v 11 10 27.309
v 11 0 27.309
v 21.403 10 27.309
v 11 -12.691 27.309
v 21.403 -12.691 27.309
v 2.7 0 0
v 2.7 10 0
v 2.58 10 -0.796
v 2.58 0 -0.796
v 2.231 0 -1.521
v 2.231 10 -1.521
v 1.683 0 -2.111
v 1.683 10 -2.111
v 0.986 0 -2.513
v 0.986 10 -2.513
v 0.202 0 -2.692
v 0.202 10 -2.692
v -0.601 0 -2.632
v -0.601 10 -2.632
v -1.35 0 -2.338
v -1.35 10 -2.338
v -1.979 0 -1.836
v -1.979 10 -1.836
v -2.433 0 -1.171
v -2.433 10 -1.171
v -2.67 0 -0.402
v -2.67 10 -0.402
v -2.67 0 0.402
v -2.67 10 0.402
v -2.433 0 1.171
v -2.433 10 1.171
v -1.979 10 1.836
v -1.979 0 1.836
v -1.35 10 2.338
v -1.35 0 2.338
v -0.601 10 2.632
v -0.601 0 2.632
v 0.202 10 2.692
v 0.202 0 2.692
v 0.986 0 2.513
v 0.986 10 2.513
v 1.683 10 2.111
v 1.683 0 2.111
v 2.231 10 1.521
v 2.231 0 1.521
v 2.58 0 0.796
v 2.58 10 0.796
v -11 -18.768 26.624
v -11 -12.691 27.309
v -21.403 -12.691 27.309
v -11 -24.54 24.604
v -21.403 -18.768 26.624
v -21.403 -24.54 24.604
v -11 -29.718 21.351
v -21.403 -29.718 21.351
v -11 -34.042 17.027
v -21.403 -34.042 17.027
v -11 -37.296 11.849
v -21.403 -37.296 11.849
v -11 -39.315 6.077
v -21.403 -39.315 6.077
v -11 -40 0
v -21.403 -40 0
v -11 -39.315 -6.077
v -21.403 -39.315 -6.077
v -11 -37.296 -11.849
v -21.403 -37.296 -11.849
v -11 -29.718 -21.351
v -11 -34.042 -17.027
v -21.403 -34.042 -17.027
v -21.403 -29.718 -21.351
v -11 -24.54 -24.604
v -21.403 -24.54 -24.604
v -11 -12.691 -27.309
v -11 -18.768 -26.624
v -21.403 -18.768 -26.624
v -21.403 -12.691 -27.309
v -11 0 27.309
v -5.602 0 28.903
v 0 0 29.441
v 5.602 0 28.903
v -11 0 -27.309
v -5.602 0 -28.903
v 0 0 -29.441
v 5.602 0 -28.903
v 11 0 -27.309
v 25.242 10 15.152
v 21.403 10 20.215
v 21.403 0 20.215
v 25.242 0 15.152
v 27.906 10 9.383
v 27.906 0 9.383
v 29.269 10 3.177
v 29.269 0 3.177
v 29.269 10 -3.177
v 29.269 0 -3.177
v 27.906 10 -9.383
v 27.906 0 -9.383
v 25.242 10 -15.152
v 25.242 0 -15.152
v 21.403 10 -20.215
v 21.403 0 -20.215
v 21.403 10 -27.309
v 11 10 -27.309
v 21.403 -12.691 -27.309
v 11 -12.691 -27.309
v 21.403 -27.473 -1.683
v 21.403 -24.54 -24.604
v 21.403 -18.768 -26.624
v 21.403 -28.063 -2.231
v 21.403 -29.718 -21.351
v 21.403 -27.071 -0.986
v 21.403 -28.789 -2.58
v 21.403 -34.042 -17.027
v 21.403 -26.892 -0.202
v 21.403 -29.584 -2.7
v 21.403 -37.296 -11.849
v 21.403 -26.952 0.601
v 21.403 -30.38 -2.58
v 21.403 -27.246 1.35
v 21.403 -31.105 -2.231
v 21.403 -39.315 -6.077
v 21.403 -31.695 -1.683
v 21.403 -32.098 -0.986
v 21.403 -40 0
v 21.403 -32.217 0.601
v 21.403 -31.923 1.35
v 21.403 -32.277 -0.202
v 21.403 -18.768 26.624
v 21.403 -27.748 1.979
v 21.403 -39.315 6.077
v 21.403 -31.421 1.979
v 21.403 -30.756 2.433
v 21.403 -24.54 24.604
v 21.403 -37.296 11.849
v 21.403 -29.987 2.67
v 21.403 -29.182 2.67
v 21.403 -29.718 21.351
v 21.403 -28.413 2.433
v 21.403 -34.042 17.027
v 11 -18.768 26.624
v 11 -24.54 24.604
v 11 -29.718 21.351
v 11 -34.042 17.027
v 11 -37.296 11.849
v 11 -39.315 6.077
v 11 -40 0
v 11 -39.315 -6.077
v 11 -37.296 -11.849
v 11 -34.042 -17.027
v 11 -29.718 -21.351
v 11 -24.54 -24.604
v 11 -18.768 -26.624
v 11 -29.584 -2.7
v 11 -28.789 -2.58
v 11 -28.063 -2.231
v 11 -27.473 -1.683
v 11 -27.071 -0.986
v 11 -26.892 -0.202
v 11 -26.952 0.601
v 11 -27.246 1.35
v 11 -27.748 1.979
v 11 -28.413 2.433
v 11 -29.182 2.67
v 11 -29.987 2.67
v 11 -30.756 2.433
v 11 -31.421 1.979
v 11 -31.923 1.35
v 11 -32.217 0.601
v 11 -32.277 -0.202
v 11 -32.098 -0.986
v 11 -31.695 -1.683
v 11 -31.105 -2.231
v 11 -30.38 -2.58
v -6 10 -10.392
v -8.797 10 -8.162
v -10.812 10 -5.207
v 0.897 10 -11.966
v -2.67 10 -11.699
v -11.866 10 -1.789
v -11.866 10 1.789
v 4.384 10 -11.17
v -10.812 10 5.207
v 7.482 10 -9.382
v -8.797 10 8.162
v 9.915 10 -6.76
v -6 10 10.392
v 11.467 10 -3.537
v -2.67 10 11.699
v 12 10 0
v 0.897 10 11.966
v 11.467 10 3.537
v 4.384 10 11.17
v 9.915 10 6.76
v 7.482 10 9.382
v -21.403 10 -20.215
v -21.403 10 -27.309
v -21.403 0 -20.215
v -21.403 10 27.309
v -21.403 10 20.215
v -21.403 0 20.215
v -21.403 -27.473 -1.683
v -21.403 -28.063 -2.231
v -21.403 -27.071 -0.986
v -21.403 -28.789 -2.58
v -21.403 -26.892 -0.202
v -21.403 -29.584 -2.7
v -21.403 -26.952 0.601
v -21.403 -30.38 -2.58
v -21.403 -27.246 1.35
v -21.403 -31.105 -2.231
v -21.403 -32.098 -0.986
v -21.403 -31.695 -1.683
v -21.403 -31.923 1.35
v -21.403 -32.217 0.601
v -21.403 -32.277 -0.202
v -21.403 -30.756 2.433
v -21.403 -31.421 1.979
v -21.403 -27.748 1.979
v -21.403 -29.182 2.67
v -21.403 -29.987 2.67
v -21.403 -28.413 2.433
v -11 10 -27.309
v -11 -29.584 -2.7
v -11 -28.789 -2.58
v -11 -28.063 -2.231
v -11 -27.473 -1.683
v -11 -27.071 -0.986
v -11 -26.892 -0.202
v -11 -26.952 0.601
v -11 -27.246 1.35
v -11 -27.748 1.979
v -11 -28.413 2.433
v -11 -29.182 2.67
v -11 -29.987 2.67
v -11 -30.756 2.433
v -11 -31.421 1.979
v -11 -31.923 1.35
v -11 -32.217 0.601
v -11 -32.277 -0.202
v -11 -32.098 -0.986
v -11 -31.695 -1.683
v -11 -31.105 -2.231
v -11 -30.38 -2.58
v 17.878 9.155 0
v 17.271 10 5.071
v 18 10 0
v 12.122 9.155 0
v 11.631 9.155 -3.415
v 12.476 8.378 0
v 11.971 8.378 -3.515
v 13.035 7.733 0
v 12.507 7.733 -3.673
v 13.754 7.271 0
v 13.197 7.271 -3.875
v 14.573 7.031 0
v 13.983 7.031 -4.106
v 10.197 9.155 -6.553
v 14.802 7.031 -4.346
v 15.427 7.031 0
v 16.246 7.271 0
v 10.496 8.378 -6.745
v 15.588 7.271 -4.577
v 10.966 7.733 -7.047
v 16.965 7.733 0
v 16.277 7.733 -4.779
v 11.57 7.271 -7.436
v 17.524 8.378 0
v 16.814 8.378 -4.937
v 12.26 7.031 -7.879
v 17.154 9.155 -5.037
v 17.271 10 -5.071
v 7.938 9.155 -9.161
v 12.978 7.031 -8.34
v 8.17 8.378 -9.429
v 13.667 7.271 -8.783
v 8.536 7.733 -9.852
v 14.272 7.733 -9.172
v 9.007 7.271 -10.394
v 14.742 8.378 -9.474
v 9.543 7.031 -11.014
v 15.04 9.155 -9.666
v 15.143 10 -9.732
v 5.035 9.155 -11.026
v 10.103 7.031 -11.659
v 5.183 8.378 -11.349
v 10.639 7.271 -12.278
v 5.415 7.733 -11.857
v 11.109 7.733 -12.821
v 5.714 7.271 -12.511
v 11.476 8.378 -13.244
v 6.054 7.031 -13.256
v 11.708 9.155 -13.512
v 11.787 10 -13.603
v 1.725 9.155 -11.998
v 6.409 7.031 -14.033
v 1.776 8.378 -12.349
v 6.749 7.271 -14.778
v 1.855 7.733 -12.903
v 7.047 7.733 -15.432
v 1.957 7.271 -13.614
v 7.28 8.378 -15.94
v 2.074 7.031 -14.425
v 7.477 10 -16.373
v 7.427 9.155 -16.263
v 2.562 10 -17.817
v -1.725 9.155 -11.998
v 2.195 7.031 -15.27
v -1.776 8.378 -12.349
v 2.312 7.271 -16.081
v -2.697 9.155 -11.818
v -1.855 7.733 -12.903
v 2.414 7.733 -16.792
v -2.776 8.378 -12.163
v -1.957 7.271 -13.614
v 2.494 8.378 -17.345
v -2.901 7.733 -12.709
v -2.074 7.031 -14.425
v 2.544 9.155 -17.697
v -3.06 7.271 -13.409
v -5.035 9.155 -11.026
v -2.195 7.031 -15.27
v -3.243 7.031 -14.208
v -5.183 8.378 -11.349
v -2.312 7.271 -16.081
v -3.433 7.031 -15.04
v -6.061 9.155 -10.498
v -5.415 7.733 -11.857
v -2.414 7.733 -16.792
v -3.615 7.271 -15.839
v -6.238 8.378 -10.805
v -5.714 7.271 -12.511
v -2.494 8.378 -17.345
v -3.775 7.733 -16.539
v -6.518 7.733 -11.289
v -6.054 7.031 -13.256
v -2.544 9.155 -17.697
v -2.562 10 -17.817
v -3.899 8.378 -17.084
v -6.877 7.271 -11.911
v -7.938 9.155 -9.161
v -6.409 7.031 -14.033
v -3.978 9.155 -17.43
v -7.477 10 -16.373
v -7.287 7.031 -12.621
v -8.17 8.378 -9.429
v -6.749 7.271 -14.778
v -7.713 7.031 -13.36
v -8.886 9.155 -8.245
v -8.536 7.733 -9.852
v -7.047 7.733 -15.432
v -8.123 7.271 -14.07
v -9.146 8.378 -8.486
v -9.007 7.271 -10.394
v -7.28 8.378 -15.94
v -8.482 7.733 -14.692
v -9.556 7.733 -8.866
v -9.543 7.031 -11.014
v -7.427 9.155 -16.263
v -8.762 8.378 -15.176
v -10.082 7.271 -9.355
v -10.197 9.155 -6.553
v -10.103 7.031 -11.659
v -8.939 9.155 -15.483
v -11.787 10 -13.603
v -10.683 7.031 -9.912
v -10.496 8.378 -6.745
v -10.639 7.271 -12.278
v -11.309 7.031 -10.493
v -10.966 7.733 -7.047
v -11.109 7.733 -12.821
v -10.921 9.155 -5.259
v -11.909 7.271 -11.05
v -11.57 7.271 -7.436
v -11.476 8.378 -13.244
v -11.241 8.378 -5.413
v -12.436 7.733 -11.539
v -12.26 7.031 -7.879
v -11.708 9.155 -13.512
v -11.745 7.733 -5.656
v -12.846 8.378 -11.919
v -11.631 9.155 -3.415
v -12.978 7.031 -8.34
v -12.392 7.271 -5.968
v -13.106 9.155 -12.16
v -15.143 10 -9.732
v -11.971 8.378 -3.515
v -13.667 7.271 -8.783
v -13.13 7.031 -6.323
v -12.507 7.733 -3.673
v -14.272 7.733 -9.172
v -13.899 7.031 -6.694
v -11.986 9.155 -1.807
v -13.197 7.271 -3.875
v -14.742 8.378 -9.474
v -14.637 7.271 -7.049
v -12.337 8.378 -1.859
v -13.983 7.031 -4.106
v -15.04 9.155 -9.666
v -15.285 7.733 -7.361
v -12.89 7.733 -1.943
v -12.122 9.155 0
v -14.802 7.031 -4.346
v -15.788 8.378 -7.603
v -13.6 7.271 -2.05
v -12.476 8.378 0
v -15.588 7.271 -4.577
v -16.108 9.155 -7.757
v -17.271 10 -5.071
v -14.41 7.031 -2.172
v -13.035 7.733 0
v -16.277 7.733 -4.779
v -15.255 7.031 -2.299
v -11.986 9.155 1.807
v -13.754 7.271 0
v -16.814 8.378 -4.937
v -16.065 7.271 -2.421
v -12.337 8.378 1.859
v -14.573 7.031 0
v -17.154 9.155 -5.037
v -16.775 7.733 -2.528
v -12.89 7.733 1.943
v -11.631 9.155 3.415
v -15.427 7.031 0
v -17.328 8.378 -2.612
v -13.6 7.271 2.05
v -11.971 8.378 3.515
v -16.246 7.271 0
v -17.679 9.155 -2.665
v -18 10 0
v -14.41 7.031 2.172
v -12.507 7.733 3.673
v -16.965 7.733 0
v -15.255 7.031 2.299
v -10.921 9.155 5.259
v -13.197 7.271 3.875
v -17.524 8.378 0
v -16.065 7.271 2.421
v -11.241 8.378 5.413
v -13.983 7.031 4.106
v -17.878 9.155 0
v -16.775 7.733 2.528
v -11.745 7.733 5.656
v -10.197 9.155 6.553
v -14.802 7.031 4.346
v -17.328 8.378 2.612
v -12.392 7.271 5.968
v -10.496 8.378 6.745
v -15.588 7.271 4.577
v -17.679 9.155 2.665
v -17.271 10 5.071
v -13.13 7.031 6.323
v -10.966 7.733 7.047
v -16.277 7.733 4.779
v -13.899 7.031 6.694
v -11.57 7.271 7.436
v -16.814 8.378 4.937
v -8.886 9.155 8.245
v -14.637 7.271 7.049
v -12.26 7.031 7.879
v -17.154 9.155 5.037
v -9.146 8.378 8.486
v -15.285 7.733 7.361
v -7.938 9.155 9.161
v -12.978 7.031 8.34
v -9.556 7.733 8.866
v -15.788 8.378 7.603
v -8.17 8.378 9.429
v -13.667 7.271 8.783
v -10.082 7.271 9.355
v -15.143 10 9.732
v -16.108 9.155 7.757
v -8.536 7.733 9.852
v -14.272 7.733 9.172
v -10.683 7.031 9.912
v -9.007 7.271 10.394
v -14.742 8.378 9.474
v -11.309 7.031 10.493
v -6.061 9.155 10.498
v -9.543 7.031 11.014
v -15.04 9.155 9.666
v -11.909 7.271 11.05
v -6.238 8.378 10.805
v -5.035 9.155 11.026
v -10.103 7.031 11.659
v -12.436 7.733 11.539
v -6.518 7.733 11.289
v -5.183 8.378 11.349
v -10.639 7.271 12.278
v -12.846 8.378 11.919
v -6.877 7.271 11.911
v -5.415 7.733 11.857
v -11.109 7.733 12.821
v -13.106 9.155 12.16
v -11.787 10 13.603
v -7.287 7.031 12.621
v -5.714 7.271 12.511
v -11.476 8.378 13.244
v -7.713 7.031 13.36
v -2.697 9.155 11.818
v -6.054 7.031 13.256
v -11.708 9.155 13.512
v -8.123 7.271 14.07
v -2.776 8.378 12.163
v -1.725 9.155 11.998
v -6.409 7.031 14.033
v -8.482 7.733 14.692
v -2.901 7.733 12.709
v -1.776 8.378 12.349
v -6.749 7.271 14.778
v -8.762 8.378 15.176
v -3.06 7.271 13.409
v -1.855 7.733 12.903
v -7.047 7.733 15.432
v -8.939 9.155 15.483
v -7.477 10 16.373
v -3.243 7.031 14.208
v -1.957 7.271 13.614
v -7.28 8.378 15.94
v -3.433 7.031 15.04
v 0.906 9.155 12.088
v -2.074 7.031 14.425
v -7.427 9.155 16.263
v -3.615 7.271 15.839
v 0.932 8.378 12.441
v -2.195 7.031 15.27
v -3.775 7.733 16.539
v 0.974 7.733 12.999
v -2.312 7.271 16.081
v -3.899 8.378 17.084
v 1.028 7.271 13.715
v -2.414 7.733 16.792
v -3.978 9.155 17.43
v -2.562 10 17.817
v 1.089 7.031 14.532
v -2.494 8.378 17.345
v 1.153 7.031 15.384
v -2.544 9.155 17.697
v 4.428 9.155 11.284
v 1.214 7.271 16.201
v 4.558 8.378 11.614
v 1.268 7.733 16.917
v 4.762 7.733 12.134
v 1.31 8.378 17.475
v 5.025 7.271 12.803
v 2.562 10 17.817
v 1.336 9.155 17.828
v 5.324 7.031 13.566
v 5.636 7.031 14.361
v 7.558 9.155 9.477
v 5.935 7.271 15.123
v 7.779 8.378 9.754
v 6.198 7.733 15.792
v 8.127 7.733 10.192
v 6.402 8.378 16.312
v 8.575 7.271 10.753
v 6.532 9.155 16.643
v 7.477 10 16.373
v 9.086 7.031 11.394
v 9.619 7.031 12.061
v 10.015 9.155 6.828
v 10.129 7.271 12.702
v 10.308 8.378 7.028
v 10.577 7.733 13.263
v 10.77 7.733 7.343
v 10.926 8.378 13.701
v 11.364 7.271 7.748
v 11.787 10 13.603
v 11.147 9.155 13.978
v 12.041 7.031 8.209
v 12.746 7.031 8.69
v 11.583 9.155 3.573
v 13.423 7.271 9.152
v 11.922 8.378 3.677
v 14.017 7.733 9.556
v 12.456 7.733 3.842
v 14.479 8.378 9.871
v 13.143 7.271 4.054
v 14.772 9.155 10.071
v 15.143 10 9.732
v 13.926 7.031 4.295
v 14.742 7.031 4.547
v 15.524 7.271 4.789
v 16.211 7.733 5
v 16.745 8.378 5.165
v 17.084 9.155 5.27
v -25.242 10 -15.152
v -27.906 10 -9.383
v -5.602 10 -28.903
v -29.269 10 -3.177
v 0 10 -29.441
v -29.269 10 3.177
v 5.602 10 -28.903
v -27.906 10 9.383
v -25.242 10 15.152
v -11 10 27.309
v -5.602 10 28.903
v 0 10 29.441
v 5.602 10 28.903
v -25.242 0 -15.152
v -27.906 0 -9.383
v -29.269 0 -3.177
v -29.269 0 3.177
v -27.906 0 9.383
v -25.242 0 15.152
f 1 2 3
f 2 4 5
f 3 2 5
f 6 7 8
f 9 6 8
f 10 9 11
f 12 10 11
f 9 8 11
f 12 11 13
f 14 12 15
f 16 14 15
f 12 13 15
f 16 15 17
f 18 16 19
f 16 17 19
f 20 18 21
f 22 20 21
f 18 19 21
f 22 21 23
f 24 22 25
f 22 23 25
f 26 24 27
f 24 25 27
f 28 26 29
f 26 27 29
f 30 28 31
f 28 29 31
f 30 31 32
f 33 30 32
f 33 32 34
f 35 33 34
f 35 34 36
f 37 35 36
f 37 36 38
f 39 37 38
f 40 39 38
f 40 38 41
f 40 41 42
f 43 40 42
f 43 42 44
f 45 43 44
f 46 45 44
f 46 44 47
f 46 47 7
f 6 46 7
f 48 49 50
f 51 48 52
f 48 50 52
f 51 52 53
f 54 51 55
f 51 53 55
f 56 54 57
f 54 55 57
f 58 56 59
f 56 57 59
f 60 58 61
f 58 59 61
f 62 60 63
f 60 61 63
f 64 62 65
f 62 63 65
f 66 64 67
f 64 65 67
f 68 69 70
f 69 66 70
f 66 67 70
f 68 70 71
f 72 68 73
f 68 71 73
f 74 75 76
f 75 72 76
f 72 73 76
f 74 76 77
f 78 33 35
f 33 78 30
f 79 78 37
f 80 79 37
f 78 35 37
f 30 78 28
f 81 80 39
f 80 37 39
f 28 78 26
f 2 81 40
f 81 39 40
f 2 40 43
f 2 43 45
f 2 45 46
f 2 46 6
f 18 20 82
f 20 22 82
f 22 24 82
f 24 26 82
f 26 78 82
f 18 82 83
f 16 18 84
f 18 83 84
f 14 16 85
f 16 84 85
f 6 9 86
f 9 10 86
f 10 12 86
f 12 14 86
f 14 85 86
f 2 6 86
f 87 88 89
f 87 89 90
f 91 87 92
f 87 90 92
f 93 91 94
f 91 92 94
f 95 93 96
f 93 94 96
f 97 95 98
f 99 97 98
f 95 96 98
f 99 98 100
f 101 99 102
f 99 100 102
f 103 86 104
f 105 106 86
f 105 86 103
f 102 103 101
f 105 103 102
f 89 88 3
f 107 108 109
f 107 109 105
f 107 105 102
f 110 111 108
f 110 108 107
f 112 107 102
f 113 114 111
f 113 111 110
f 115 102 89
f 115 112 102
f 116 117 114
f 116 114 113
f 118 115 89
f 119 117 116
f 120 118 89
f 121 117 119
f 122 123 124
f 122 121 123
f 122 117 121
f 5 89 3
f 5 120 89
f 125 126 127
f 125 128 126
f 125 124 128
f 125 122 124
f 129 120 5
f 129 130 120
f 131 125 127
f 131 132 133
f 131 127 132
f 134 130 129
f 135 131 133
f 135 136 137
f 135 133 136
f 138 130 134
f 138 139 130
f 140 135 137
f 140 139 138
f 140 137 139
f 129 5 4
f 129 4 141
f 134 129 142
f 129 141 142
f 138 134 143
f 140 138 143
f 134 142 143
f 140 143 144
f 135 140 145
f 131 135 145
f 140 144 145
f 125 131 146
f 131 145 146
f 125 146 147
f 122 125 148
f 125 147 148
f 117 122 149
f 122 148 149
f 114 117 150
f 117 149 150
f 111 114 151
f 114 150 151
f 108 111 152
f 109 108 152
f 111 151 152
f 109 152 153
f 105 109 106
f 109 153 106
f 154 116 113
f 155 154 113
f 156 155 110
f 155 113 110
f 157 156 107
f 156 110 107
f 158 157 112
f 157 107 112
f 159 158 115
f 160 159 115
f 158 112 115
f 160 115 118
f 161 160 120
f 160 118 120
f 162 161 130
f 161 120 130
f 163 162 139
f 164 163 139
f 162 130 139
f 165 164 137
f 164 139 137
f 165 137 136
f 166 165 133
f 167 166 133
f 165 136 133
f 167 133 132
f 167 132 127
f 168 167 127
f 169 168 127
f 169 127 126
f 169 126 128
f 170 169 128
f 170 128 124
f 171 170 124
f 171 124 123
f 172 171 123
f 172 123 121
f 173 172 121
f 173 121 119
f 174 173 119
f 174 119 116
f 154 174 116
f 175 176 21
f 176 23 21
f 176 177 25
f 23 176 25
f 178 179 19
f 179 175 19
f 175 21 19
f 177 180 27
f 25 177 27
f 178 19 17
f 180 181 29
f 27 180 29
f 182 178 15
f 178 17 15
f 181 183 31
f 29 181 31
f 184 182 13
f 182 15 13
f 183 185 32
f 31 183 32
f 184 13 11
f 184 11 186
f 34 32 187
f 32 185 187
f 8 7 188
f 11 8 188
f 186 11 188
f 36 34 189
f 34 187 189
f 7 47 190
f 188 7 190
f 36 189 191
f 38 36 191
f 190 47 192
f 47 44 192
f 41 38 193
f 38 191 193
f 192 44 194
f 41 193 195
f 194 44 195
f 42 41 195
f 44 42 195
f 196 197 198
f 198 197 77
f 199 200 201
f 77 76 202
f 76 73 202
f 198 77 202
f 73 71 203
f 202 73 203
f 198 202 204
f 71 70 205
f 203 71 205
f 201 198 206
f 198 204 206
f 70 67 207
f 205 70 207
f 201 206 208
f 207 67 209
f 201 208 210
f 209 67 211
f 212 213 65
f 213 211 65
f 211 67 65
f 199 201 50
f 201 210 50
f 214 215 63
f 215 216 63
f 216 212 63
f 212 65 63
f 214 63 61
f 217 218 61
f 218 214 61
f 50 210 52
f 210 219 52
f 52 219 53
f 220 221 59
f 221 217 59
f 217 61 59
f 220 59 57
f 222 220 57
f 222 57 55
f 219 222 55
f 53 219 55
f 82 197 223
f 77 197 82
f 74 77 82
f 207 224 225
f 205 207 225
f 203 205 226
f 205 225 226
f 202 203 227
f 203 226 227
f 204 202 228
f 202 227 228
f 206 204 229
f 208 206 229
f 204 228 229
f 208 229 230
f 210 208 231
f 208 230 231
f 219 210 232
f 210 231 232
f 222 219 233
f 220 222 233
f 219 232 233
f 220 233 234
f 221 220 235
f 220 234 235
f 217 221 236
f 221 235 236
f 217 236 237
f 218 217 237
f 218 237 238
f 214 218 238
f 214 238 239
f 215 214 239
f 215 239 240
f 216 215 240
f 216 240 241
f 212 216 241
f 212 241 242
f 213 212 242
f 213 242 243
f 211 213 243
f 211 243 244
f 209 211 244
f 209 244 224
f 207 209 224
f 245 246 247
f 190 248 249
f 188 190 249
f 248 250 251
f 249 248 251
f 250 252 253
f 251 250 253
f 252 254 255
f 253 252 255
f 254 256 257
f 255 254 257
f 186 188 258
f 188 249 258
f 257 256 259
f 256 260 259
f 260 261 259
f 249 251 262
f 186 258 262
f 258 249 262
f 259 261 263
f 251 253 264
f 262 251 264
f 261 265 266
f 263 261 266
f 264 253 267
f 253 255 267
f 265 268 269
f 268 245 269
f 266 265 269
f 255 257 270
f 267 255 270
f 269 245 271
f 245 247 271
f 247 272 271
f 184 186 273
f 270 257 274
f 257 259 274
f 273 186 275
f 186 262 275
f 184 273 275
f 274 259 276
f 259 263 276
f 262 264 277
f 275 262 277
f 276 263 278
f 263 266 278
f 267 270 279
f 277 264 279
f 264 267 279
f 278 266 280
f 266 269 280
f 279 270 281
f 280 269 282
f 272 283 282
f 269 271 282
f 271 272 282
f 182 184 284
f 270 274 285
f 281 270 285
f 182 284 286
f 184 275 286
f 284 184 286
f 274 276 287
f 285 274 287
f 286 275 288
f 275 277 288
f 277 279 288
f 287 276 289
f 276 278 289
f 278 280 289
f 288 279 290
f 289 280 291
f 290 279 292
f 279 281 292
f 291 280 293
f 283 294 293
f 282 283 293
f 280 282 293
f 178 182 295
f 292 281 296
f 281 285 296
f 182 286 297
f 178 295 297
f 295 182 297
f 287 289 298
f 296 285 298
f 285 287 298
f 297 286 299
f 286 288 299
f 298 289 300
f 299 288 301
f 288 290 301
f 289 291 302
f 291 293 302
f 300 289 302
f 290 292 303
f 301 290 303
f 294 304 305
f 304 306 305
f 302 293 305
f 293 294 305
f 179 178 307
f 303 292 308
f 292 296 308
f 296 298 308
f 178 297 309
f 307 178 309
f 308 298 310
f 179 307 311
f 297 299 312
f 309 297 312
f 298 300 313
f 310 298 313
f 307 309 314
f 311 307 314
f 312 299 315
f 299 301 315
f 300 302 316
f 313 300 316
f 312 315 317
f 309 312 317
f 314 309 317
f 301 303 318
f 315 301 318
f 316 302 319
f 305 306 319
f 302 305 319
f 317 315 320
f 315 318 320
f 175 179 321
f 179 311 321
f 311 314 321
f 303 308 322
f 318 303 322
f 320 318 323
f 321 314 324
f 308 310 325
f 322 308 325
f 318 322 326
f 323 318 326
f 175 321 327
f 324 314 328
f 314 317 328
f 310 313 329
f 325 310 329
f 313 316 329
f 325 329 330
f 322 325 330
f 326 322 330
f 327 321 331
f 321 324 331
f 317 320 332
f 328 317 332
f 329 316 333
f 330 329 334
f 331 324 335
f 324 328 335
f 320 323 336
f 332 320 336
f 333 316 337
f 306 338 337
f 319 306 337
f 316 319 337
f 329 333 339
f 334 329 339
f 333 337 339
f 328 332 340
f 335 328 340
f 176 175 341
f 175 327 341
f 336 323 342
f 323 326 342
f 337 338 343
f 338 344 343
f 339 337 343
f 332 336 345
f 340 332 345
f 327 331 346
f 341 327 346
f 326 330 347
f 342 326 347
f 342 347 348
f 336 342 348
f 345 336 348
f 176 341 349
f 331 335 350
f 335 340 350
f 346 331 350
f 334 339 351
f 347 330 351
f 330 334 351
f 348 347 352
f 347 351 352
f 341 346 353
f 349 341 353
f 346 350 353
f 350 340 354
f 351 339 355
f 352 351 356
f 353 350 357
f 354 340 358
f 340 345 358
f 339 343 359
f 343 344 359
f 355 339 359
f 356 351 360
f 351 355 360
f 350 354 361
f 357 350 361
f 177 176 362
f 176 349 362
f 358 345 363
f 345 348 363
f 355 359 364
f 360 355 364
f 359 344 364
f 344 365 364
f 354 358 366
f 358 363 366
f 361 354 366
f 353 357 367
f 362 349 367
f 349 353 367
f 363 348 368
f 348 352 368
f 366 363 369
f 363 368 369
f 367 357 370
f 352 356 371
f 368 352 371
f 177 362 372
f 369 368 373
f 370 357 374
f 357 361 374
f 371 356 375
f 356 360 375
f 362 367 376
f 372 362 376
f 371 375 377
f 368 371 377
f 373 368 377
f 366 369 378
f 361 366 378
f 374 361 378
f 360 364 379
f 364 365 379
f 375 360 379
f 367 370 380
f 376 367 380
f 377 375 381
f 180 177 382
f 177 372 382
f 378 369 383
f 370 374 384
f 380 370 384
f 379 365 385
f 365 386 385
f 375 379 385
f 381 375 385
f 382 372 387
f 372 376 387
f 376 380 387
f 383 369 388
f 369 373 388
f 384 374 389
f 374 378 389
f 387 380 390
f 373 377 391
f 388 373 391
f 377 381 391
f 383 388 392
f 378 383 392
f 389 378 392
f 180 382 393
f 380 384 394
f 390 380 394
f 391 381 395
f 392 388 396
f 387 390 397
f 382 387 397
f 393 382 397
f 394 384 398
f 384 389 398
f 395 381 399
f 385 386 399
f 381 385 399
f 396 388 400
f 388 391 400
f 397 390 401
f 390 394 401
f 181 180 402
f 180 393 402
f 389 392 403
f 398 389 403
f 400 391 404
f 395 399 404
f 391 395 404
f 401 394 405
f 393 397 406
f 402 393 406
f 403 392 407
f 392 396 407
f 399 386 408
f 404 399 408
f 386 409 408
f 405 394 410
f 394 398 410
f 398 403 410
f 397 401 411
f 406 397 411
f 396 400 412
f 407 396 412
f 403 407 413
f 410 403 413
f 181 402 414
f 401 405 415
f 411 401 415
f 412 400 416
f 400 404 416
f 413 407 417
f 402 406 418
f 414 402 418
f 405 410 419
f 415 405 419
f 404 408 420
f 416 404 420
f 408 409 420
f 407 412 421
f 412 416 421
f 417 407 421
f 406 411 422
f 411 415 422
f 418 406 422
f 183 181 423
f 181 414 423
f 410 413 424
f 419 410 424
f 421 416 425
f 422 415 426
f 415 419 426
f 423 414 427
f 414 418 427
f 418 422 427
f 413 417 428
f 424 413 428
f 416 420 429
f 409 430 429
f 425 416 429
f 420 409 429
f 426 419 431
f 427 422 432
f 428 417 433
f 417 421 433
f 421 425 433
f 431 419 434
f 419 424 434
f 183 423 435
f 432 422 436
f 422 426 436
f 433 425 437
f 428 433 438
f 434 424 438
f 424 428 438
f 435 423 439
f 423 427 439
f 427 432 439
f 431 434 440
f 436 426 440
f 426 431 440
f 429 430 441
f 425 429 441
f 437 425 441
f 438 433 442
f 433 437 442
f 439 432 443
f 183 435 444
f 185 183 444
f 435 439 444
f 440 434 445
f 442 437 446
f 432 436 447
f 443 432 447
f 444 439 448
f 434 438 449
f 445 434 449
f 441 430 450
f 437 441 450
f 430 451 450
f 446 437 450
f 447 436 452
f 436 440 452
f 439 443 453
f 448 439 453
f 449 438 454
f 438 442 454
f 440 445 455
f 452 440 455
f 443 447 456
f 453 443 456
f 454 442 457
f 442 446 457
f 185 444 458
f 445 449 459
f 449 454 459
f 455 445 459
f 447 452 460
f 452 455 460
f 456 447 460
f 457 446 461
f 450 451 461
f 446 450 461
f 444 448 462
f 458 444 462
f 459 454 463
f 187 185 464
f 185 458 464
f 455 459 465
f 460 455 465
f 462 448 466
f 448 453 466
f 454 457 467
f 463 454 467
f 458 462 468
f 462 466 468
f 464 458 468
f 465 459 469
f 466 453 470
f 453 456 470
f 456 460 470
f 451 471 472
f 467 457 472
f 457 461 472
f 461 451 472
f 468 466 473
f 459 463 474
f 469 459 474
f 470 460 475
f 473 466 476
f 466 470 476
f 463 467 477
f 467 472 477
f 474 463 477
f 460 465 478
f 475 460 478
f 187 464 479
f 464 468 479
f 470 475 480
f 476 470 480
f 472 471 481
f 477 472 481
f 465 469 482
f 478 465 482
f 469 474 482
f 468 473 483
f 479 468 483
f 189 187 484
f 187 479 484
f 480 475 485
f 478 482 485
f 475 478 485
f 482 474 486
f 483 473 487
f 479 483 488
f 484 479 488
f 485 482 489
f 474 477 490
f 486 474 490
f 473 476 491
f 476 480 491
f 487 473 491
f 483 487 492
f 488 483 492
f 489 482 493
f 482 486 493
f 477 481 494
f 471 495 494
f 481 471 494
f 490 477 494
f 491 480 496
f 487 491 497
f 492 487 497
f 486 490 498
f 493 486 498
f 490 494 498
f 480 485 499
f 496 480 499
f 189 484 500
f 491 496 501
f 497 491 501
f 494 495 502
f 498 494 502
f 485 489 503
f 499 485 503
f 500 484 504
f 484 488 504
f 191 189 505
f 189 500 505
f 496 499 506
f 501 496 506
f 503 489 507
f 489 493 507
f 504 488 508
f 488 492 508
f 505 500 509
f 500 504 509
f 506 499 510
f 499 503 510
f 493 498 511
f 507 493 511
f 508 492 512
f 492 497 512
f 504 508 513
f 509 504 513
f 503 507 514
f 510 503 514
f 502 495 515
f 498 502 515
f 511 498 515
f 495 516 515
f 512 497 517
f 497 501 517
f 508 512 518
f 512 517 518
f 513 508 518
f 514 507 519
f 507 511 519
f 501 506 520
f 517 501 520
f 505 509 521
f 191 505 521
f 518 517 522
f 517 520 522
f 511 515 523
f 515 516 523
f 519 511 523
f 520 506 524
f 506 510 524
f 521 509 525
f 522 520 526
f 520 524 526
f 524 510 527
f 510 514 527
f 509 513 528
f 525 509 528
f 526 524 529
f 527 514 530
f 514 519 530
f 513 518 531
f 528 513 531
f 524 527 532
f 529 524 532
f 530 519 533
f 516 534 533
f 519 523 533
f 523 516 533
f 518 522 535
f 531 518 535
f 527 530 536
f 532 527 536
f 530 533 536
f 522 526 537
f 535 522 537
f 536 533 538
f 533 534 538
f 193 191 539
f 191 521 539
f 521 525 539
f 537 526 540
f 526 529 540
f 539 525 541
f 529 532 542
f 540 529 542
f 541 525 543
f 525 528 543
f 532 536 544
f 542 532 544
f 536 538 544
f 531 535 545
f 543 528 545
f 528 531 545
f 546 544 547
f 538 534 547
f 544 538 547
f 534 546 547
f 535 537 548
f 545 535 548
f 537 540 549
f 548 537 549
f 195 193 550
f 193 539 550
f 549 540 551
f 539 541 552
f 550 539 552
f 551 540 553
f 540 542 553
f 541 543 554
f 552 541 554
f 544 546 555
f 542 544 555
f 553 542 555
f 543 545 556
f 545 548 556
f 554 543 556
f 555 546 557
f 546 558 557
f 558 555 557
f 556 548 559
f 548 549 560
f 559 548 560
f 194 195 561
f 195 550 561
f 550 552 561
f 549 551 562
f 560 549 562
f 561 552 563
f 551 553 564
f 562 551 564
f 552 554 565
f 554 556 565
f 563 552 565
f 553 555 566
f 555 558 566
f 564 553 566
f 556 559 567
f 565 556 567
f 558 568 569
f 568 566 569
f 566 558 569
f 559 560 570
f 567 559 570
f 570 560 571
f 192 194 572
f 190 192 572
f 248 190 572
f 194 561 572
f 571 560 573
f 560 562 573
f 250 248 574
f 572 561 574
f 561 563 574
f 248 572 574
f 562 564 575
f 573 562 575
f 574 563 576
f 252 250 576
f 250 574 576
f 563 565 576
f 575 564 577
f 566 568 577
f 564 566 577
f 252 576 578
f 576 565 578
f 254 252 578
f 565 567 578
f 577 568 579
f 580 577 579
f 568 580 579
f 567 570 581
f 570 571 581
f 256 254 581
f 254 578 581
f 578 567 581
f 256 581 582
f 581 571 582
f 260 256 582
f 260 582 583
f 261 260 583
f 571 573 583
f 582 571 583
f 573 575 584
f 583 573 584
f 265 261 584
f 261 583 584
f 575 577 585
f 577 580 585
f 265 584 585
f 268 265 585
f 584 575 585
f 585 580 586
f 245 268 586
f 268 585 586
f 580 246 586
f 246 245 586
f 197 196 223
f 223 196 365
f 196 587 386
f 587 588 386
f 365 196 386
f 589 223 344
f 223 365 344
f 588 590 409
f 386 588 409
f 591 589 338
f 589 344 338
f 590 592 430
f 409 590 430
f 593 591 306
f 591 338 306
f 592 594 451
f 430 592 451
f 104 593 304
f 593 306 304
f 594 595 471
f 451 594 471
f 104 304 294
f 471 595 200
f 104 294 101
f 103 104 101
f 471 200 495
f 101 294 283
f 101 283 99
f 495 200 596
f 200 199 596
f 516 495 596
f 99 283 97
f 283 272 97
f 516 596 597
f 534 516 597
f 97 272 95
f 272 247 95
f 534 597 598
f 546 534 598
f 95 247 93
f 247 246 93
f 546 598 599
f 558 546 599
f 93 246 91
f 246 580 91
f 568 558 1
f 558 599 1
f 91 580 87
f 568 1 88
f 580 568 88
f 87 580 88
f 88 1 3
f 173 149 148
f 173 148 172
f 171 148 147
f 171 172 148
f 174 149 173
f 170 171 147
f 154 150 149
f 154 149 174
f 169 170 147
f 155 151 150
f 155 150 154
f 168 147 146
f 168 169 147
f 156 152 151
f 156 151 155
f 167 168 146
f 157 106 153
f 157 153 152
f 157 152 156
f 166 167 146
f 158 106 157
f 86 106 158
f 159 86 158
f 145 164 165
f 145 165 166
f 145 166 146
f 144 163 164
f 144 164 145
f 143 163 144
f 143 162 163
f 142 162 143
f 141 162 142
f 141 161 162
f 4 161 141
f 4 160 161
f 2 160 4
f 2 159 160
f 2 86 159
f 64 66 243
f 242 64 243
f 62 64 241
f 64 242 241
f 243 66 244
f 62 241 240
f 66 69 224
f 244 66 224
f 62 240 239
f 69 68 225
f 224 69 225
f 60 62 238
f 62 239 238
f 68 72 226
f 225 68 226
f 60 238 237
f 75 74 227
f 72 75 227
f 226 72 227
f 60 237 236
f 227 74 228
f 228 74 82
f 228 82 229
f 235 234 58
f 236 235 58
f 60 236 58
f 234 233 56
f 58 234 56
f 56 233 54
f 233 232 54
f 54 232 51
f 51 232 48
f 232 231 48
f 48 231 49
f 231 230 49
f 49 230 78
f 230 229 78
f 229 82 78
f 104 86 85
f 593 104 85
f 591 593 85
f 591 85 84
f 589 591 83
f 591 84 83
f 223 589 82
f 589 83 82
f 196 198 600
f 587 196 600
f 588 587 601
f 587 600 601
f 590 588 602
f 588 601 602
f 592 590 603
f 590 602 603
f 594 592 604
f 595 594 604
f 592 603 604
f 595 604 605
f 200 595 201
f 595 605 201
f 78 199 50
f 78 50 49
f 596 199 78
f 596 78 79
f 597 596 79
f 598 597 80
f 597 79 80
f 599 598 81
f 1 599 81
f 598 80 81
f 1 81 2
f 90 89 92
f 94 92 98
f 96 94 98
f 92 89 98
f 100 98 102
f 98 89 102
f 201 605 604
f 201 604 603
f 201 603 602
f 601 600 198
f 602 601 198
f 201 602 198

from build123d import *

# Parameters (mm, degrees)
SKETCH1_R                = 29.440979716
BOSS_EXTRUDE1_DEPTH      = 10
SKETCH2_W                = 10.403384244
SKETCH2_H                = 54.617626702
BOSS_EXTRUDE2_DEPTH      = 40
BOSS_EXTRUDE2_DEPTH_BACK = 10
SKETCH3_R                = 2.7
CUT_EXTRUDE1_DEPTH       = 80
SKETCH4_R                = 2.7
CUT_EXTRUDE2_DEPTH       = 80
CUT_EXTRUDE2_DEPTH_BACK  = 80
SKETCH6_R                = 3
CUT_EXTRUDE3_DEPTH       = 80


with BuildPart() as part:
    # Sketch1 → Boss-Extrude1 (new body)
    with BuildSketch(Plane(origin=(0, 0, 0), x_dir=(1, 0, 0), z_dir=(0, 1, 0))):
        Circle(SKETCH1_R)
    extrude(amount=BOSS_EXTRUDE1_DEPTH)

    # Sketch2 → Boss-Extrude2 (add, two sides)
    with BuildSketch(Plane.XZ) as boss_extrude2_sk:
        with Locations((-16.201692122, 0)):
            Rectangle(SKETCH2_W, SKETCH2_H)
        with Locations((16.201692122, 0)):
            Rectangle(SKETCH2_W, SKETCH2_H)
    extrude(amount=BOSS_EXTRUDE2_DEPTH)
    extrude(boss_extrude2_sk.sketch, amount=-BOSS_EXTRUDE2_DEPTH_BACK)

    # Sketch3 → Cut-Extrude1 (cut)
    with BuildSketch(Plane(origin=(21.403384244, 0, 0), x_dir=(0, 0, -1), z_dir=(1, 0, 0))):
        with Locations((0, -29.584442491)):
            Circle(SKETCH3_R)
    extrude(amount=-CUT_EXTRUDE1_DEPTH, mode=Mode.SUBTRACT)

    # Sketch4 → Cut-Extrude2 (cut, two sides)
    with BuildSketch(Plane(origin=(0, 10, 0), x_dir=(1, 0, 0), z_dir=(0, 1, 0))) as cut_extrude2_sk:
        Circle(SKETCH4_R)
    extrude(amount=CUT_EXTRUDE2_DEPTH, mode=Mode.SUBTRACT)
    extrude(cut_extrude2_sk.sketch, amount=-CUT_EXTRUDE2_DEPTH_BACK, mode=Mode.SUBTRACT)

    # Cut-Sweep1: sweep along a path in Sketch5
    with BuildLine(Plane(origin=(0, 10, 0), x_dir=(1, 0, 0), z_dir=(0, 1, 0))) as cut_sweep1_path:
        CenterArc((0, 0), 15, 0, 360)
    # Sketch6 → Cut-Sweep1 (sweep, cut)
    with BuildSketch(Plane.XY):
        with Locations((-15, 10)):
            Circle(SKETCH6_R)
    sweep(path=cut_sweep1_path.line, mode=Mode.SUBTRACT)

    # Sketch8 → Cut-Extrude3 (cut)
    with BuildSketch(Plane.ZY.offset(21.403384244)):
        with BuildLine():
            Line((-27.308813351, -12.691186649), (-33.56023991, -12.691186649))
            Line((-33.56023991, -12.691186649), (-33.56023991, -51.85966326))
            Line((-33.56023991, -51.85966326), (31.545819747, -51.85966326))
            Line((31.545819747, -51.85966326), (31.545819747, -12.691186649))
            Line((31.545819747, -12.691186649), (27.308813351, -12.691186649))
            ThreePointArc((27.308813351, -12.691186649), (0, -40), (-27.308813351, -12.691186649))
        make_face()
    extrude(amount=-CUT_EXTRUDE3_DEPTH, mode=Mode.SUBTRACT)


solid = part.part
